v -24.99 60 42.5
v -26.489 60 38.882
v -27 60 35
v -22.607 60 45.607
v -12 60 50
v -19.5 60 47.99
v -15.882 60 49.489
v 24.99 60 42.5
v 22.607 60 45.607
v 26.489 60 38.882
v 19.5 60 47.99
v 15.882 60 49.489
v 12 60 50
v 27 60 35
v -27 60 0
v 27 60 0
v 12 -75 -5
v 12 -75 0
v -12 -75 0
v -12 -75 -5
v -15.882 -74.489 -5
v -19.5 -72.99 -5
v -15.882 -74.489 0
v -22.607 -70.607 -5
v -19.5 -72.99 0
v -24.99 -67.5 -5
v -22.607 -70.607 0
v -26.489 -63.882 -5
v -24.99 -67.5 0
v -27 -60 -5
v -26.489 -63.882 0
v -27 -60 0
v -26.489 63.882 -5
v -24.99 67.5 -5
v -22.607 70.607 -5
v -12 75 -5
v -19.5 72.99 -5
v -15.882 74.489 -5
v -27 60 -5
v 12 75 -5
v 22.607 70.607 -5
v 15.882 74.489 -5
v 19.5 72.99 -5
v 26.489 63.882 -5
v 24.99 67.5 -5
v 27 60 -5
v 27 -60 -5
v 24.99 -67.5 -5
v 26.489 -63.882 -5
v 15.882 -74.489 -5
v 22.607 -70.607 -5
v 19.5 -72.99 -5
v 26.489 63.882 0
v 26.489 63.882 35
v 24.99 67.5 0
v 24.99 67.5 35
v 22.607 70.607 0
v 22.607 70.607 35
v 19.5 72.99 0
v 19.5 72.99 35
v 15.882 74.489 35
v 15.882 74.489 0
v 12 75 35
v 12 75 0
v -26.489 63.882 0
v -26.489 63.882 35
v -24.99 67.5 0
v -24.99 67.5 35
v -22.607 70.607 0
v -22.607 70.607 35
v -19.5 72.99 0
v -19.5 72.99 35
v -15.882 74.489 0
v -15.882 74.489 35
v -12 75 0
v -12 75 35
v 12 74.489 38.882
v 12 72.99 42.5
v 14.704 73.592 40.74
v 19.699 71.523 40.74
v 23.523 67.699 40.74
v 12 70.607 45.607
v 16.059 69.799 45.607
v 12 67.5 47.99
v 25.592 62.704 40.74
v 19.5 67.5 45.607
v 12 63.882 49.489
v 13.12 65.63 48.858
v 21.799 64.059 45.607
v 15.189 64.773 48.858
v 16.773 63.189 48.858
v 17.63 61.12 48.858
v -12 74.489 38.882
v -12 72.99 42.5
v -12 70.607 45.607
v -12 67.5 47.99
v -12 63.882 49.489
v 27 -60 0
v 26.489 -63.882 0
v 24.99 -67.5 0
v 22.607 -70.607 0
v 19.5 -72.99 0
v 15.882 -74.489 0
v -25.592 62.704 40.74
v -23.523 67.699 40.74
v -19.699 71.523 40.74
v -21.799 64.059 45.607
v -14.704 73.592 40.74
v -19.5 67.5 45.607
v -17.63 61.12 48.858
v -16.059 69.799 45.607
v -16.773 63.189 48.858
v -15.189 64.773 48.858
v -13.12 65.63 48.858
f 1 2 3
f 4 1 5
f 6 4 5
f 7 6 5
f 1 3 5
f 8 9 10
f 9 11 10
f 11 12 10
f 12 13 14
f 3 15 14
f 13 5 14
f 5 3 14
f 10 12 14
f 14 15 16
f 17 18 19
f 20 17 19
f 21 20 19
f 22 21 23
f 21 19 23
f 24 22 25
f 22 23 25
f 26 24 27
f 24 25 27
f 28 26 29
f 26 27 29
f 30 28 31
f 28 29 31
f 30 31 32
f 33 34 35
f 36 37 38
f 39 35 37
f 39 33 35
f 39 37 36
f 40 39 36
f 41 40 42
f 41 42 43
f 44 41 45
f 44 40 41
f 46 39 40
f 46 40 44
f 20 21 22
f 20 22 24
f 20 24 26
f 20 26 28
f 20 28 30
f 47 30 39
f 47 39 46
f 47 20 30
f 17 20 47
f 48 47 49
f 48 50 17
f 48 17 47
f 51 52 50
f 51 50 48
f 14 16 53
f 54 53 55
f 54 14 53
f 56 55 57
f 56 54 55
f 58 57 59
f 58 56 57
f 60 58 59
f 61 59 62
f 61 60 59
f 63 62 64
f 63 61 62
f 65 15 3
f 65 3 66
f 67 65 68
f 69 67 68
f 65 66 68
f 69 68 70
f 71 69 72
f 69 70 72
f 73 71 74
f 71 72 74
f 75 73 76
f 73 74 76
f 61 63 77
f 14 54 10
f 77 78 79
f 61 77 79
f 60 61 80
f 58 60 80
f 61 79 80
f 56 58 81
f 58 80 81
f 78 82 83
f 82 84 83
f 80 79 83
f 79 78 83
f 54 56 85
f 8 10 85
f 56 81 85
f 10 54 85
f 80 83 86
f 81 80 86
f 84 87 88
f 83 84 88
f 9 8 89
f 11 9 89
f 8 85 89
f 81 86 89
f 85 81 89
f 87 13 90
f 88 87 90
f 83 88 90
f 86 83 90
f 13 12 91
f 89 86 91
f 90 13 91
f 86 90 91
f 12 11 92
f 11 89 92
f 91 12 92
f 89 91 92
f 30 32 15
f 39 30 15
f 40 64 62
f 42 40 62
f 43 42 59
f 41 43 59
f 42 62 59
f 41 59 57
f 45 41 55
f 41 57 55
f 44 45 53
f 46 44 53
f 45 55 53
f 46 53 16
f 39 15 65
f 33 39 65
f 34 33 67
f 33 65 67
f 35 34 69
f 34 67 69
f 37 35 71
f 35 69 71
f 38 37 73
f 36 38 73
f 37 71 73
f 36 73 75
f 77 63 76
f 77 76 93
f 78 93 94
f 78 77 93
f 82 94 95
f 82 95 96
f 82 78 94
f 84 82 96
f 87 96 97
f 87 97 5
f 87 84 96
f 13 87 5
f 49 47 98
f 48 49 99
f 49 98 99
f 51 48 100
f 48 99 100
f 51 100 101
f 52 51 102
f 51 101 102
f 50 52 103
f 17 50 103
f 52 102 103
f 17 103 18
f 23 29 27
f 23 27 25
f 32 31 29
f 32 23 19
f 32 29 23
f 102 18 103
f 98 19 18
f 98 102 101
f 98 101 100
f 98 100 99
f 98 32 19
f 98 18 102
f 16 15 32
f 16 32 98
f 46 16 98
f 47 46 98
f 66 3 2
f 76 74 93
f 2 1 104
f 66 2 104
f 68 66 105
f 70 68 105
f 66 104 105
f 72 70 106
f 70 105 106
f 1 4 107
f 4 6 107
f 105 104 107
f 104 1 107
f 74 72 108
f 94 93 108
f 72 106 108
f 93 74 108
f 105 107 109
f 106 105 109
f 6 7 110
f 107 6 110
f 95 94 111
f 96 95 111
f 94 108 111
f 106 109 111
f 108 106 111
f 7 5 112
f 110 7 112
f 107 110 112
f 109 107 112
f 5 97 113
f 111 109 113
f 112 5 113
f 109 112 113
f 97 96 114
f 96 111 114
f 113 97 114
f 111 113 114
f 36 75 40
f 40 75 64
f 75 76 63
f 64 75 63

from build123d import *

# Parameters (mm, degrees)
F0_W     = 54
F0_H     = 150
F1_DEPTH = 50
F2_R     = 15
F3_R     = 15
F5_DEPTH = 5
F6_W     = 121.107407
F6_H     = 159.268379
F7_DEPTH = 50.001


with BuildPart() as f1:
    # F0 (on Top) → F1 (new body)
    with BuildSketch(Plane.XY):
        Rectangle(F0_W, F0_H)
    extrude(amount=F1_DEPTH)

    # F2
    f2_edges = [f1.edges().sort_by_distance(p)[0] for p in [
        (27, -75, 25),
        (-27, -75, 25),
        (27, 75, 25),
        (-27, 75, 25),
    ]]
    fillet(f2_edges, radius=F2_R)

    # F3
    f3_edges = [f1.edges().sort_by_distance(p)[0] for p in [
        (-27, 0, 50),
    ]]
    fillet(f3_edges, radius=F3_R)

    # F4 (on face) → F5 (join)
    with BuildSketch(Plane(origin=(0, 0, 0), x_dir=(1, 0, 0), z_dir=(0, 0, -1))):
        with BuildLine():
            ThreePointArc((12, -75), (22.606602, -70.606602), (27, -60))
            Line((27, -60), (27, 60))
            ThreePointArc((27, 60), (22.606602, 70.606602), (12, 75))
            Line((12, 75), (-12, 75))
            ThreePointArc((-12, 75), (-22.606602, 70.606602), (-27, 60))
            Line((-27, 60), (-27, -60))
            ThreePointArc((-27, -60), (-22.606602, -70.606602), (-12, -75))
            Line((-12, -75), (12, -75))
        make_face()
    extrude(amount=F5_DEPTH)

    # F6 (on Top) → F7 (cut, through all)
    with BuildSketch(Plane.XY):
        with Locations((-1.455303, -19.634189)):
            Rectangle(F6_W, F6_H)
    extrude(amount=F7_DEPTH, mode=Mode.SUBTRACT)


solid = f1.part
